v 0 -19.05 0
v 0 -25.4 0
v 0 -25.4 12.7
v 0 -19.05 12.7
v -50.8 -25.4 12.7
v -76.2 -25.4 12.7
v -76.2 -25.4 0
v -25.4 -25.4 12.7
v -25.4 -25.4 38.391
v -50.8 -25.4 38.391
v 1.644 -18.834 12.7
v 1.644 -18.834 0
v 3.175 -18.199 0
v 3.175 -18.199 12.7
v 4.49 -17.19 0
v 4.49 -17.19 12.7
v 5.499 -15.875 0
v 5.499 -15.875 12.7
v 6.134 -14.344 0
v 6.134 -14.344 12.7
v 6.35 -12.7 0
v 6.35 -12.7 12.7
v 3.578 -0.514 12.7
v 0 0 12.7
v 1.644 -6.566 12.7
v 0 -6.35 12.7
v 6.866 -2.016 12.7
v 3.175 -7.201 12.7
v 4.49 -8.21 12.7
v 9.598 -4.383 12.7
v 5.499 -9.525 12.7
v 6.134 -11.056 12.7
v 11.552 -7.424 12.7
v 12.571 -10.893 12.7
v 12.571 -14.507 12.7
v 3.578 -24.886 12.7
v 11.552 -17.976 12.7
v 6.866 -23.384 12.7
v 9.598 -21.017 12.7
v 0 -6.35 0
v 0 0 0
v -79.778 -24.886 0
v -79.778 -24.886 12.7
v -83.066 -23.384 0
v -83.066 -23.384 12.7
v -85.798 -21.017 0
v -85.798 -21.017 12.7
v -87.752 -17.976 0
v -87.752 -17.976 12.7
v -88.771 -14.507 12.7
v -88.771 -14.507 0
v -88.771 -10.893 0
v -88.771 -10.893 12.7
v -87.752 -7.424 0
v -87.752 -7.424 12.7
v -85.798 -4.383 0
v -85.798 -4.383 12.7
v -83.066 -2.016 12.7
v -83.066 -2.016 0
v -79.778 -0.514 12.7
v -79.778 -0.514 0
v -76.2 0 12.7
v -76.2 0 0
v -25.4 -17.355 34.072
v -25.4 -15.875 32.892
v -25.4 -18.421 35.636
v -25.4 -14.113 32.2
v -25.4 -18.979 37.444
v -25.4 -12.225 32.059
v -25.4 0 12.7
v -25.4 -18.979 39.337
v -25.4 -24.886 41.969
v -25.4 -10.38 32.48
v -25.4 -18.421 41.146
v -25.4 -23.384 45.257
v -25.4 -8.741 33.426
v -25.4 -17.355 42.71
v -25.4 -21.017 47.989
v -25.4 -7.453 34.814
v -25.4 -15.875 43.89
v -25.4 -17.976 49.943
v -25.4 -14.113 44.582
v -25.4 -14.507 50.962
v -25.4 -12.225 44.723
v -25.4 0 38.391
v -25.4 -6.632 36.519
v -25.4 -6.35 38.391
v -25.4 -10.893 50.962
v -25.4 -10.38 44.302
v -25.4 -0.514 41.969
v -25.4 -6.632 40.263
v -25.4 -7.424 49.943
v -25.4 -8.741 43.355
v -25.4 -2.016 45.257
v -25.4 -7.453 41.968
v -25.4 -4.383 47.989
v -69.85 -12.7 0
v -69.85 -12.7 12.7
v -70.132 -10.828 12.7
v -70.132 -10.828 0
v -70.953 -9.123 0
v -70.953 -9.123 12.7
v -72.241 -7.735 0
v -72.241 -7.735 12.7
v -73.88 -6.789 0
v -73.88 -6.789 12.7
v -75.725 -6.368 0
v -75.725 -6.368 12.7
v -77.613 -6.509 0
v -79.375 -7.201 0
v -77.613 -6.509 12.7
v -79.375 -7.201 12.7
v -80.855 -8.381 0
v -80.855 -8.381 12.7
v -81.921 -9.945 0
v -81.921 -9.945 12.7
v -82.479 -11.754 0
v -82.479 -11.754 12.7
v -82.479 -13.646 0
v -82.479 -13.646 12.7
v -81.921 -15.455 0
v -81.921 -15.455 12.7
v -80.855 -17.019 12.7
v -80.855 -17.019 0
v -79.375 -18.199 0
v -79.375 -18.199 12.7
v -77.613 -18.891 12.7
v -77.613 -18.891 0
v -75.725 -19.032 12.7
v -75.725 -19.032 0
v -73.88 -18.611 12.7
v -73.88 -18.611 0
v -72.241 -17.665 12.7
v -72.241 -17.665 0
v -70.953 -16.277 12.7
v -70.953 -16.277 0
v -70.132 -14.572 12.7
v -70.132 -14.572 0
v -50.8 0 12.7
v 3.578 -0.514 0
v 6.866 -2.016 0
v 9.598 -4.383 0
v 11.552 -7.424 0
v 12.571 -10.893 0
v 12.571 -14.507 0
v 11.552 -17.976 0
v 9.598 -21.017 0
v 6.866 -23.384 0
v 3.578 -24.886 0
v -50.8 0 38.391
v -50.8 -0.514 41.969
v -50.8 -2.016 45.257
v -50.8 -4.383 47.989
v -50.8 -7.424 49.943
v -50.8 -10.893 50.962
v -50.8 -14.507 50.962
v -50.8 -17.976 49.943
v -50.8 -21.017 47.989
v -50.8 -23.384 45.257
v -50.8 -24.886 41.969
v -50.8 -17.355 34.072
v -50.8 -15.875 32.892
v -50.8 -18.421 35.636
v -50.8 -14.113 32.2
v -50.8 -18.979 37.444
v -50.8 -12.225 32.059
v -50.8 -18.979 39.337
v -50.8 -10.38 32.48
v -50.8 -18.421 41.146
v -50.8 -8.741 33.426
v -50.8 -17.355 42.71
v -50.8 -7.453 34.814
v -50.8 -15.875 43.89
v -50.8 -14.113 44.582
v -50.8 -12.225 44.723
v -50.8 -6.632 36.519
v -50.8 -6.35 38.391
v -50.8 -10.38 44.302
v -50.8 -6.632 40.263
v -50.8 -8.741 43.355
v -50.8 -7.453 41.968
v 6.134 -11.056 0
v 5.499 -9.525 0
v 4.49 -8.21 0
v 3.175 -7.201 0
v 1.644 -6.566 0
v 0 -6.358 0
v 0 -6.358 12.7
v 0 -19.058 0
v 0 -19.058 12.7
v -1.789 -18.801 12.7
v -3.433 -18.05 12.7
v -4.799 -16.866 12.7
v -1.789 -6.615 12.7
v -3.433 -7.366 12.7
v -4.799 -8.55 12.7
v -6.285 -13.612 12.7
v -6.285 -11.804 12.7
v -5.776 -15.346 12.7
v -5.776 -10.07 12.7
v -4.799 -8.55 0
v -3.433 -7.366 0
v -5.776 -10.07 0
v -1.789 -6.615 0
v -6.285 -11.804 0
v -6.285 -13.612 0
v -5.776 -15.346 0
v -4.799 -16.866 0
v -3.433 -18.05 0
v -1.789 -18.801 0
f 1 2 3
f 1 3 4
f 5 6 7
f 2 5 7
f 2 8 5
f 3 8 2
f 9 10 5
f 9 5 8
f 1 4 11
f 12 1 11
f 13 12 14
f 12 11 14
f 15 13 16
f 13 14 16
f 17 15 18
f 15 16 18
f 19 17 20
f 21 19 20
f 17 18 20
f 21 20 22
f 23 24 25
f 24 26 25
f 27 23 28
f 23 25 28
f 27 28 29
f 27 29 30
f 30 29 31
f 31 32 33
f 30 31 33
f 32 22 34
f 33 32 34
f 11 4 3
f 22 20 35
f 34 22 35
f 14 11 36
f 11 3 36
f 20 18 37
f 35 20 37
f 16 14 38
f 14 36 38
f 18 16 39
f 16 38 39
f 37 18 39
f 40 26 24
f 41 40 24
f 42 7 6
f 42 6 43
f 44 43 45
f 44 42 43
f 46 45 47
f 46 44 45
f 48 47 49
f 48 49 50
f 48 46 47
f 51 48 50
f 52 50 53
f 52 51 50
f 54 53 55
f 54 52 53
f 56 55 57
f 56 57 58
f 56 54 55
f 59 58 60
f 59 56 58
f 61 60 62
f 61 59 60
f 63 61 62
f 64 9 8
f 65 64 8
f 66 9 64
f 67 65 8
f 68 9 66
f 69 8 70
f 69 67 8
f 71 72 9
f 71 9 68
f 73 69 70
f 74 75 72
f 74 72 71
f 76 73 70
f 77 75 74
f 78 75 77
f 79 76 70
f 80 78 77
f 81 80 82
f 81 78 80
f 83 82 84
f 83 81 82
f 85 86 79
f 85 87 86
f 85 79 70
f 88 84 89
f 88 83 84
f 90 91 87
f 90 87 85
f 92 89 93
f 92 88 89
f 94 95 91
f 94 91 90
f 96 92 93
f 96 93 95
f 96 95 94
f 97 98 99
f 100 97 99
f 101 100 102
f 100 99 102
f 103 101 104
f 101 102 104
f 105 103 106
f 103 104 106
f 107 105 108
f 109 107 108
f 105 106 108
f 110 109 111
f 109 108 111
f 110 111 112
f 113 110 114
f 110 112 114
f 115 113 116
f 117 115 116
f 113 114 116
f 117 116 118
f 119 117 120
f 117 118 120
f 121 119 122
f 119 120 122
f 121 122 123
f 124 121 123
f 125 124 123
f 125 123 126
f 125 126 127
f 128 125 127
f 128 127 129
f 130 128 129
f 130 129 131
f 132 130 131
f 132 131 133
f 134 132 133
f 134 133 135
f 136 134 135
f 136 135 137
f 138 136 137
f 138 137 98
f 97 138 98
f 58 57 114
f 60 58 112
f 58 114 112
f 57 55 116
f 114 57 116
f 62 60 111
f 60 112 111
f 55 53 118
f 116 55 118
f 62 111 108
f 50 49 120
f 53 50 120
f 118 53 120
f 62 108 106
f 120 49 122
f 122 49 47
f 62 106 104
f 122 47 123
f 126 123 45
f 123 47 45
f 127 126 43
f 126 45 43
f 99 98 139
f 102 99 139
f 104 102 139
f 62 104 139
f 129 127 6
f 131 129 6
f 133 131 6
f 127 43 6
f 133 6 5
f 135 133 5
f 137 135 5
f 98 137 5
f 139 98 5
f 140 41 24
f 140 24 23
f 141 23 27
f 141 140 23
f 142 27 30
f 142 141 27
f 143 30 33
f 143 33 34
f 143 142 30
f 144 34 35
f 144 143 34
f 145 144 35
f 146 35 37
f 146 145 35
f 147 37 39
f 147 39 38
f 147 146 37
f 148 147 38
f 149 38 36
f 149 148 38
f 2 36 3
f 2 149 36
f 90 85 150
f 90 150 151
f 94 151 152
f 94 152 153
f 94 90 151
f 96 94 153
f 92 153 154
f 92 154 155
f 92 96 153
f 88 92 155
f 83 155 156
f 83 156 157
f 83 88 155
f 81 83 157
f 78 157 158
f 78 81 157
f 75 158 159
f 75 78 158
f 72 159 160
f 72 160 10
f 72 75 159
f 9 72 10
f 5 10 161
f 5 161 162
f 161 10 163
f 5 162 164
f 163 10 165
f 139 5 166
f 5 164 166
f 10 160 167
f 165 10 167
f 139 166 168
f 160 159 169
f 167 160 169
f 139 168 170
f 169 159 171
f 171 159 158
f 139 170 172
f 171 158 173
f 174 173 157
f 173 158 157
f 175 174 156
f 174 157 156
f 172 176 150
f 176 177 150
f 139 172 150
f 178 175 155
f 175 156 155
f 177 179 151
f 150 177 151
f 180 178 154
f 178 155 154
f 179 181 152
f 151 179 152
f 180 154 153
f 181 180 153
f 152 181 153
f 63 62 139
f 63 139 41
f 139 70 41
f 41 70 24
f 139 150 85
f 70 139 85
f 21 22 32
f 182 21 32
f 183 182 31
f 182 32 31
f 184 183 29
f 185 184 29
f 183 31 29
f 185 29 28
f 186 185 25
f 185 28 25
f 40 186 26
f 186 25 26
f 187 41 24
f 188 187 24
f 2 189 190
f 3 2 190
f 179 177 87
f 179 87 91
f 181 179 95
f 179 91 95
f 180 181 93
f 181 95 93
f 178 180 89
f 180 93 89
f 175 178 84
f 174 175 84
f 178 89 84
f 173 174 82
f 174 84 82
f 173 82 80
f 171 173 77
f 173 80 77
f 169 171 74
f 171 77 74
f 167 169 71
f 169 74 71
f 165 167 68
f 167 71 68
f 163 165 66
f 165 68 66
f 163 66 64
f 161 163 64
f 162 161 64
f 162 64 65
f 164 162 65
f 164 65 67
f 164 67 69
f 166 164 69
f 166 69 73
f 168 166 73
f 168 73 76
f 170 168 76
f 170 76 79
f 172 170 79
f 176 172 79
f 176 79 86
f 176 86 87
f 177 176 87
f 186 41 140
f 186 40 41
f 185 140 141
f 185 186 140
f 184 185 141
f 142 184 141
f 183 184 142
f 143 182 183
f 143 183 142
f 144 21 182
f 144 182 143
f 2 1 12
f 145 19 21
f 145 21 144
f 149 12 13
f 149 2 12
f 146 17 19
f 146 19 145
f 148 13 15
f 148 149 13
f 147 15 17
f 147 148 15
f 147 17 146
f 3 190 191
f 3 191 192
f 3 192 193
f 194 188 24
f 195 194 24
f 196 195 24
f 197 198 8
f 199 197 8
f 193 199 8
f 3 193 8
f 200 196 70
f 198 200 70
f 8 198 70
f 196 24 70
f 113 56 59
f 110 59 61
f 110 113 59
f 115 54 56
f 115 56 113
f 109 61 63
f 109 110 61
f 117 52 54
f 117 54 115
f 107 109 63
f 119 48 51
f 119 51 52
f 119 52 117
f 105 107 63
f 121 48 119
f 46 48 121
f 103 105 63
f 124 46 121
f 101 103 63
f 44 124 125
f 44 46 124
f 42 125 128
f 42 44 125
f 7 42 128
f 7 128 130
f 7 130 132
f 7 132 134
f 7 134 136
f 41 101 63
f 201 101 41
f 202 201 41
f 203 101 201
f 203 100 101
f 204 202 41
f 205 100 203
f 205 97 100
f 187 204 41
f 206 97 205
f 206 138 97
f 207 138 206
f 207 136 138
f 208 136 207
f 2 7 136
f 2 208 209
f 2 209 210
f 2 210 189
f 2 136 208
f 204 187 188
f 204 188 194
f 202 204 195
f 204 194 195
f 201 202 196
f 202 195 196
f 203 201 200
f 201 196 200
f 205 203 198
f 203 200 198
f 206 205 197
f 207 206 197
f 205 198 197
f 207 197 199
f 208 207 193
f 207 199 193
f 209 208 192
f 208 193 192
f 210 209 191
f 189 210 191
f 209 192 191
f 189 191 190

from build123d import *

# Parameters (mm, degrees)
F1_DEPTH  = 25.4
F3_DEPTH  = 12.7
F5_DEPTH  = 12.7
F7_DEPTH  = 12.701
F9_DEPTH  = 12.701
F10_R     = 6.35
F11_DEPTH = 12.701
F13_DEPTH = 25.4
F14_R     = 6.35
F15_DEPTH = 63.501


with BuildPart() as f1:
    # F0 (on Front) → F1 (new body)
    with BuildSketch(Plane.XZ):
        Polygon((-76.2, 12.7), (-76.2, 0), (0, 0), (0, 12.7), (-25.4, 12.7), (-25.4, 38.39084), (-50.8, 38.39084), (-50.8, 12.7), align=None)
    extrude(amount=F1_DEPTH)

    # F2 (on face) → F3 (join)
    with BuildSketch(Plane(origin=(0, 0, 0), x_dir=(1, 0, 0), z_dir=(0, 0, -1))):
        with BuildLine():
            Line((-76.2, 0), (-76.2, 25.4))
            ThreePointArc((-76.2, 25.4), (-88.9, 12.7), (-76.2, 0))
        make_face()
    extrude(amount=-F3_DEPTH)

    # F8 (on face) → F9 (cut, through all)
    with BuildSketch(Plane.XY.offset(12.7)):
        with BuildLine():
            Line((0, -19.057885), (0, -6.357885))
            ThreePointArc((0, -6.357885), (-6.35, -12.707885), (0, -19.057885))
        make_face()
    extrude(amount=-F9_DEPTH, mode=Mode.SUBTRACT)

    # F10 (on face) → F11 (cut, through all)
    with BuildSketch(Plane.XY.offset(12.7)):
        with Locations((-76.2, -12.7)):
            Circle(F10_R)
    extrude(amount=-F11_DEPTH, mode=Mode.SUBTRACT)

    # F12 (on face) → F13 (join)
    with BuildSketch(Plane.YZ.offset(-25.4)):
        with BuildLine():
            Line((-25.4, 38.39084), (0, 38.39084))
            ThreePointArc((0, 38.39084), (-12.7, 51.09084), (-25.4, 38.39084))
        make_face()
    extrude(amount=-F13_DEPTH)

    # F14 (on face) → F15 (cut, through all)
    with BuildSketch(Plane.YZ.offset(-25.4)):
        with Locations((-12.7, 38.39084)):
            Circle(F14_R)
    extrude(amount=-F15_DEPTH, mode=Mode.SUBTRACT)


with BuildPart() as f5:
    # F4 (on face) → F5 (new body)
    with BuildSketch(Plane(origin=(0, 0, 0), x_dir=(1, 0, 0), z_dir=(0, 0, -1))):
        with BuildLine():
            Line((0, 25.4), (0, 0))
            ThreePointArc((0, 0), (12.7, 12.7), (0, 25.4))
        make_face()
    extrude(amount=-F5_DEPTH)

    # F6 (on face) → F7 (cut, through all)
    with BuildSketch(Plane.XY.offset(12.7)):
        with BuildLine():
            ThreePointArc((0, -19.05), (4.490128, -17.190128), (6.35, -12.7))
            ThreePointArc((6.35, -12.7), (4.490128, -8.209872), (0, -6.35))
            Line((0, -6.35), (0, -19.05))
        make_face()
    extrude(amount=-F7_DEPTH, mode=Mode.SUBTRACT)


solid = Compound([f1.part, f5.part])
